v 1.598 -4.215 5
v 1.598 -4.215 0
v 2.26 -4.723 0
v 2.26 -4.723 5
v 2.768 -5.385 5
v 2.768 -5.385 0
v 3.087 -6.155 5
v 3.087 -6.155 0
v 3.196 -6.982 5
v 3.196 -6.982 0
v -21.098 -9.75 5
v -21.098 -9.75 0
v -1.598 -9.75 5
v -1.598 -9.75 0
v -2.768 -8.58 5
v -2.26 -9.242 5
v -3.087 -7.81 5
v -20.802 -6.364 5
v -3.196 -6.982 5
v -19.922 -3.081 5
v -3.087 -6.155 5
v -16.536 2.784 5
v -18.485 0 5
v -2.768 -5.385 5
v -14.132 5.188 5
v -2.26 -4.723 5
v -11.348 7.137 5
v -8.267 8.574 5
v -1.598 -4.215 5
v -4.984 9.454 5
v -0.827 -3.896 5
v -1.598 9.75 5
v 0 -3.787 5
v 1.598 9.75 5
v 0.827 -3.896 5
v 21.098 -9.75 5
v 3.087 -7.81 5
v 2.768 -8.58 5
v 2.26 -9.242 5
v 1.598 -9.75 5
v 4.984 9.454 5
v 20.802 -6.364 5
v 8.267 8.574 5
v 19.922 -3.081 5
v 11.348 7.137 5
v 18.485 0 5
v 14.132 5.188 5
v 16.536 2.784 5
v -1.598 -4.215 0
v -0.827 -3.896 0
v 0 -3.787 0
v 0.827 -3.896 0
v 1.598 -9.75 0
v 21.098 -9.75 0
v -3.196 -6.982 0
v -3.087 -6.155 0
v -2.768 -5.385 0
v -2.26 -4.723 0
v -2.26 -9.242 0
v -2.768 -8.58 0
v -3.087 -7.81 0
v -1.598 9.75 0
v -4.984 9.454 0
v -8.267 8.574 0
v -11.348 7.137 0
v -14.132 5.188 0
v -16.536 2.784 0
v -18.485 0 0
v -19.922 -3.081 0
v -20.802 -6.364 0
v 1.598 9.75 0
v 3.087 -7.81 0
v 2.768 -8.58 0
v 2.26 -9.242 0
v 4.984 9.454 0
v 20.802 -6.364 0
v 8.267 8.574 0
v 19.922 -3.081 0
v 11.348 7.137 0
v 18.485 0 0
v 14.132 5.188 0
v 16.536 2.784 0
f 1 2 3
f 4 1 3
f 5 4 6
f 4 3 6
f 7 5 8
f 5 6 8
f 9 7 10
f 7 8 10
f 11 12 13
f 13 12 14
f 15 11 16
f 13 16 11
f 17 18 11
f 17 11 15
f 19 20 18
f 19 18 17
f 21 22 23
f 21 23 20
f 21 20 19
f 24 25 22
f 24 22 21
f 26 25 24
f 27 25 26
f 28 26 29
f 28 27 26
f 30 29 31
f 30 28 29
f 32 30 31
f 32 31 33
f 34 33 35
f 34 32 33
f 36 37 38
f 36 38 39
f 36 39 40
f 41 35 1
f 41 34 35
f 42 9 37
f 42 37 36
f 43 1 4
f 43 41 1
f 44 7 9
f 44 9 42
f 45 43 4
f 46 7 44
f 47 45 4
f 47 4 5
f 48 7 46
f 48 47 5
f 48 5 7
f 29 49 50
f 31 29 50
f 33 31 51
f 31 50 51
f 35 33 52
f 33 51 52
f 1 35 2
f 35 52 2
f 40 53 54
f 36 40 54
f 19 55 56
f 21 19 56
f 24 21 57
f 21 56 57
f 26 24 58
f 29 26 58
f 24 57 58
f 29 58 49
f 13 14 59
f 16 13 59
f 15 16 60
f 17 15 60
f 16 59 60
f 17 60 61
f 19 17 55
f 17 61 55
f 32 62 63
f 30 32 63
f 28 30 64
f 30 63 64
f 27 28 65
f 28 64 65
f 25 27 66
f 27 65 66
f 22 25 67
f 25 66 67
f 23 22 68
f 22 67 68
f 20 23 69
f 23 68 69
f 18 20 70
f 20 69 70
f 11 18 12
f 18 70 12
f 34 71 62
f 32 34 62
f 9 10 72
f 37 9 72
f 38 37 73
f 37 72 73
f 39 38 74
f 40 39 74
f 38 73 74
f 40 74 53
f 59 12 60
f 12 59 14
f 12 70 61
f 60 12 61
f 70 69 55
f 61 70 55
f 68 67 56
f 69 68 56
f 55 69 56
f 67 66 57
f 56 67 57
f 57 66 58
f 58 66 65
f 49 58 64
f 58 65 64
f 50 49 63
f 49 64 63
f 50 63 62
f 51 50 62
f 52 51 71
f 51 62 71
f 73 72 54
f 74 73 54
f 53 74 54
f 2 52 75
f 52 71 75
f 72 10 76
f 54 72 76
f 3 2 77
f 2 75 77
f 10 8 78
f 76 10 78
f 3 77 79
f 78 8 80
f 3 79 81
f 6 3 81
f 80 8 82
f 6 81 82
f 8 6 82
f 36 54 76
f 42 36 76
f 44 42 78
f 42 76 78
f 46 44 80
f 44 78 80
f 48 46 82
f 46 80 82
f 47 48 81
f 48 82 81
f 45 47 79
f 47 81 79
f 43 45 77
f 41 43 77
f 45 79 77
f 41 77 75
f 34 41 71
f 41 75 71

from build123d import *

# Parameters (mm, degrees)
F1_DEPTH = 5


with BuildPart() as f1:
    # F0 (on Top) → F1 (new body)
    with BuildSketch(Plane.XY):
        with BuildLine():
            ThreePointArc((3.1956666573, -6.9824714928), (2.7675285072, -8.5803048214), (1.5978333287, -9.75))
            Line((1.5978333287, -9.75), (4.793499986, -9.75))
            ThreePointArc((4.793499986, -9.75), (4.3653618359, -8.1521666713), (3.1956666573, -6.9824714928))
        make_face()
        with BuildLine():
            Line((-4.793499986, -9.75), (-1.5978333286, -9.75))
            ThreePointArc((-1.5978333286, -9.75), (-2.7675285072, -8.5803048214), (-3.1956666573, -6.9824714928))
            ThreePointArc((-3.1956666573, -6.9824714928), (-4.3653618359, -8.1521666713), (-4.793499986, -9.75))
        make_face()
        with BuildLine():
            ThreePointArc((3.1956666573, -6.9824714928), (4.3653618359, -8.1521666713), (4.793499986, -9.75))
            Line((4.793499986, -9.75), (12.3826613305, -9.75))
            Line((12.3826613305, -9.75), (17.9021666714, -9.75))
            ThreePointArc((17.9021666714, -9.75), (13.2777422874, 2.8582215277), (1.5978333286, 9.4863643814))
            Line((1.5978333286, 9.4863643814), (1.5978333287, -4.2149429855))
            ThreePointArc((1.5978333286, -4.2149429855), (2.7675285072, -5.3846381641), (3.1956666573, -6.9824714928))
        make_face()
        with BuildLine():
            Line((-17.9021666713, -9.75), (-4.793499986, -9.75))
            ThreePointArc((-4.793499986, -9.75), (-4.3653618359, -8.1521666713), (-3.1956666573, -6.9824714928))
            ThreePointArc((-3.1956666573, -6.9824714928), (-2.7675285072, -5.3846381641), (-1.5978333287, -4.2149429855))
            Line((-1.5978333286, -4.2149429855), (-1.5978333287, 9.4863643814))
            ThreePointArc((-1.5978333287, 9.4863643814), (-13.2777422874, 2.8582215277), (-17.9021666713, -9.75))
        make_face()
        with BuildLine():
            ThreePointArc((-1.5978333287, -4.2149429855), (0, -3.7868048355), (1.5978333286, -4.2149429855))
            Line((1.5978333287, -4.2149429855), (1.5978333286, 9.4863643814))
            ThreePointArc((1.5978333286, 9.4863643814), (0.8009617163, 9.6018935077), (0, 9.6844263783))
            ThreePointArc((0, 9.6844263783), (-0.8009617163, 9.6018935077), (-1.5978333287, 9.4863643814))
            Line((-1.5978333287, 9.4863643814), (-1.5978333286, -4.2149429855))
        make_face()
        with BuildLine():
            Line((-21.0978333287, -9.75), (-17.9021666713, -9.75))
            ThreePointArc((-17.9021666713, -9.75), (-13.2777422874, 2.8582215277), (-1.5978333287, 9.4863643814))
            Line((-1.5978333287, 9.4863643814), (-1.5978333287, 9.75))
            ThreePointArc((-1.5978333287, 9.75), (-15.3864155618, 4.0385822331), (-21.0978333286, -9.75))
        make_face()
        with BuildLine():
            ThreePointArc((0, 9.6844263783), (0.8009617163, 9.6018935077), (1.5978333286, 9.4863643814))
            Line((1.5978333286, 9.4863643814), (1.5978333286, 9.75))
            ThreePointArc((1.5978333286, 9.75), (0.798244177, 9.7335996979), (0, 9.6844263783))
        make_face()
        with BuildLine():
            Line((1.5978333286, 9.75), (1.5978333286, 9.4863643814))
            ThreePointArc((1.5978333286, 9.4863643814), (13.2777422874, 2.8582215277), (17.9021666714, -9.75))
            Line((17.9021666714, -9.75), (21.0978333287, -9.75))
            ThreePointArc((21.0978333287, -9.75), (15.3864155618, 4.0385822331), (1.5978333286, 9.75))
        make_face()
        with BuildLine():
            Line((-1.5978333287, 9.75), (-1.5978333287, 9.4863643814))
            ThreePointArc((-1.5978333287, 9.4863643814), (-0.8009617163, 9.6018935077), (0, 9.6844263783))
            ThreePointArc((0, 9.6844263783), (-0.798244177, 9.7335996979), (-1.5978333287, 9.75))
        make_face()
        with BuildLine():
            ThreePointArc((0, 9.6844263783), (0.798244177, 9.7335996979), (1.5978333286, 9.75))
            Line((1.5978333286, 9.75), (-1.5978333287, 9.75))
            ThreePointArc((-1.5978333287, 9.75), (-0.798244177, 9.7335996979), (0, 9.6844263783))
        make_face()
    extrude(amount=F1_DEPTH)


solid = f1.part
